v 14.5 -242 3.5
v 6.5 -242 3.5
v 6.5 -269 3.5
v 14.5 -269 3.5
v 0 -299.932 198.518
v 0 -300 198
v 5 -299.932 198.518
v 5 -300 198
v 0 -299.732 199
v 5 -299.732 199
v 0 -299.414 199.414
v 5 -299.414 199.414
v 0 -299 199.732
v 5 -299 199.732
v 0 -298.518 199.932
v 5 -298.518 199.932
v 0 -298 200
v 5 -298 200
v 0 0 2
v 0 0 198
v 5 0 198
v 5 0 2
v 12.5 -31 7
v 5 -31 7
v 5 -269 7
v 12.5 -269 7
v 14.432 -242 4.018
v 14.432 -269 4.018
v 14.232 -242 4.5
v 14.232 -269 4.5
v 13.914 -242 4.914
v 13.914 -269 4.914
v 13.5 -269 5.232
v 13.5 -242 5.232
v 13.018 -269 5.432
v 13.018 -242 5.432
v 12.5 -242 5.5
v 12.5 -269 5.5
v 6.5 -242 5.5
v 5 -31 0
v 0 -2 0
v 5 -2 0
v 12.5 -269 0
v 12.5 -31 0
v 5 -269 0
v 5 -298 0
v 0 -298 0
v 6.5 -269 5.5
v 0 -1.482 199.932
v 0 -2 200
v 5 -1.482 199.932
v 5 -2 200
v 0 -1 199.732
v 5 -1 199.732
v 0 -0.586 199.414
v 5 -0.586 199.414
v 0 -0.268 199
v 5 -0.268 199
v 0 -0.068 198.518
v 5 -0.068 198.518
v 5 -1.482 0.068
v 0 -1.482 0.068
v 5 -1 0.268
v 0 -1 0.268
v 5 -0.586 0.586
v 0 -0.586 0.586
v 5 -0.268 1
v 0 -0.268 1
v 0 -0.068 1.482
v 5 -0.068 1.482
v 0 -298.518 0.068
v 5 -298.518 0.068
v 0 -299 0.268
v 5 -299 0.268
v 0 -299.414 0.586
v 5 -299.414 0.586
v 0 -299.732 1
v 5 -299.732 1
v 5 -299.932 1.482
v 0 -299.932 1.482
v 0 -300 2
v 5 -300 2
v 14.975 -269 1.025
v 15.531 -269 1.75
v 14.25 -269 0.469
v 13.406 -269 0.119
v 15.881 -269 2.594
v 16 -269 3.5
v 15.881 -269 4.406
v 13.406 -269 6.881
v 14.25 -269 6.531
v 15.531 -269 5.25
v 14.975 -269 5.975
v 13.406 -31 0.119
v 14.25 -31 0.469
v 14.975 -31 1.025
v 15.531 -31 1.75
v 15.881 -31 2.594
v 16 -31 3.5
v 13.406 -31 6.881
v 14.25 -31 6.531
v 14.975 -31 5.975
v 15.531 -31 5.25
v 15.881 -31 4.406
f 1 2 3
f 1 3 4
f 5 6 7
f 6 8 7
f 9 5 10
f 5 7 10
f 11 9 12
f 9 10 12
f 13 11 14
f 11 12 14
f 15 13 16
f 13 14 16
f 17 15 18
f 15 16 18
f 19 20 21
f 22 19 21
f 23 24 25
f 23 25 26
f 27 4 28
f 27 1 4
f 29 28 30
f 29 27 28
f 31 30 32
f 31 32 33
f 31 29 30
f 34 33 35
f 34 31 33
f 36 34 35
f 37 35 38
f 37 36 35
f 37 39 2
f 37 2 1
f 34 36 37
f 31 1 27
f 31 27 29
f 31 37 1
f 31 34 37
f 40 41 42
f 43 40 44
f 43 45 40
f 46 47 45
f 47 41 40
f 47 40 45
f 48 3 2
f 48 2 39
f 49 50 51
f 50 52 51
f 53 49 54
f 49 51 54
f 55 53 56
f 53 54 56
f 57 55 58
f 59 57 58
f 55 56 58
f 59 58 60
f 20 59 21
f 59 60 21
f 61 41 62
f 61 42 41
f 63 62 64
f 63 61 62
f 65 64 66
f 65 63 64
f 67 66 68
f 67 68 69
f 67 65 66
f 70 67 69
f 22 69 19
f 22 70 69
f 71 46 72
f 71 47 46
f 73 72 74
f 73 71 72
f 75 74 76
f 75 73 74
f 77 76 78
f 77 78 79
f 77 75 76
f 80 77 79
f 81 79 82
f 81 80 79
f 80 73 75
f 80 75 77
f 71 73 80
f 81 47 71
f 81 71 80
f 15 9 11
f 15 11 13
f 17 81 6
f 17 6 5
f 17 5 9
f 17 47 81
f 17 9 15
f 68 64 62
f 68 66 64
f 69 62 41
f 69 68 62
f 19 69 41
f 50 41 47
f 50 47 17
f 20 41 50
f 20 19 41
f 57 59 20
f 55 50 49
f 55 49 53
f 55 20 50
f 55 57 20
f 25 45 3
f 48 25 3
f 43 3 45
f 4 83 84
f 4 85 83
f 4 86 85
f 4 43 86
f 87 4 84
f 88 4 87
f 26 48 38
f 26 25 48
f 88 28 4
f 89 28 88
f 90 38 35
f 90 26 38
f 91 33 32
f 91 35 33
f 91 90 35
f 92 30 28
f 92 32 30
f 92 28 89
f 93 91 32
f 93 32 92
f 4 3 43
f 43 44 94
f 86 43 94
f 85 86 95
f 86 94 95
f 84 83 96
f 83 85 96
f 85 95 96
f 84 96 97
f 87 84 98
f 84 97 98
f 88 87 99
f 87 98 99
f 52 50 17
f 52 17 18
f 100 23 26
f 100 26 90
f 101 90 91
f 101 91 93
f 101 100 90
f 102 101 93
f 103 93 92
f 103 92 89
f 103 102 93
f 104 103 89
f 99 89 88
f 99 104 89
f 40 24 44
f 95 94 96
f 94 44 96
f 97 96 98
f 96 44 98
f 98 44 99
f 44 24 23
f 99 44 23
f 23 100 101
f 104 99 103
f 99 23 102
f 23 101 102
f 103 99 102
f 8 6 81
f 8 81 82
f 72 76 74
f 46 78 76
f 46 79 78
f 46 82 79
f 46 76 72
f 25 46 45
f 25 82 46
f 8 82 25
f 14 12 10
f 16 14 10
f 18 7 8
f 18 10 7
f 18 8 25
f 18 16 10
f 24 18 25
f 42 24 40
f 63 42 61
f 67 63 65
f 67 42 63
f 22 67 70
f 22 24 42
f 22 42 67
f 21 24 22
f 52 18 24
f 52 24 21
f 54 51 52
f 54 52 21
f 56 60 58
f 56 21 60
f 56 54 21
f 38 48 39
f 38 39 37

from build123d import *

# Parameters (mm, degrees)
F0_W     = 5
F0_H     = 200
F1_DEPTH = 300
F2_W     = 11
F2_H     = 7
F3_DEPTH = 300
F4_R     = 3.49999
F5_W     = 15
F5_H     = 31
F6_DEPTH = 7.001
F7_R     = 2
F8_W     = 8
F8_H     = 2
F9_DEPTH = 27
F10_R    = 1.99999


# Not quite as in the source:
# - a fillet or chamfer is up to 0.001 mm smaller than in the source, because OpenCascade refuses the exact size


with BuildPart() as f1:
    # F0 (on Front) → F1 (new body)
    with BuildSketch(Plane.XZ):
        with Locations((2.5, 100)):
            Rectangle(F0_W, F0_H)
    extrude(amount=F1_DEPTH)

    # F2 (on face) → F3 (join)
    with BuildSketch(Plane.XZ.offset(300)):
        with Locations((10.5, 3.5)):
            Rectangle(F2_W, F2_H)
    extrude(amount=-F3_DEPTH)

    # F4 (radius 3.5 in the source; OpenCascade refuses exactly that, so slightly less here)
    f4_edges = [f1.edges().sort_by_distance(p)[0] for p in [
        (16, -150, 7),
        (16, -150, 0),
    ]]
    fillet(f4_edges, radius=F4_R)

    # F5 (on face) → F6 (cut, through all)
    with BuildSketch(Plane.XY.offset(7)):
        with Locations((12.5, -284.5)):
            Rectangle(F5_W, F5_H)
        with Locations((12.5, -15.5)):
            Rectangle(F5_W, F5_H)
    extrude(amount=-F6_DEPTH, mode=Mode.SUBTRACT)

    # F7
    f7_edges = [f1.edges().sort_by_distance(p)[0] for p in [
        (2.5, -300, 200),
        (2.5, 0, 200),
        (2.5, -300, 0),
        (2.5, 0, 0),
    ]]
    fillet(f7_edges, radius=F7_R)

    # F8 (on face) → F9 (cut)
    with BuildSketch(Plane.XZ.offset(269)):
        with Locations((10.5, 4.5)):
            Rectangle(F8_W, F8_H)
    extrude(amount=-F9_DEPTH, mode=Mode.SUBTRACT)

    # F10 (radius 2 in the source; OpenCascade refuses exactly that, so slightly less here)
    f10_edges = [f1.edges().sort_by_distance(p)[0] for p in [
        (14.5, -255.5, 5.5),
    ]]
    fillet(f10_edges, radius=F10_R)


solid = f1.part
